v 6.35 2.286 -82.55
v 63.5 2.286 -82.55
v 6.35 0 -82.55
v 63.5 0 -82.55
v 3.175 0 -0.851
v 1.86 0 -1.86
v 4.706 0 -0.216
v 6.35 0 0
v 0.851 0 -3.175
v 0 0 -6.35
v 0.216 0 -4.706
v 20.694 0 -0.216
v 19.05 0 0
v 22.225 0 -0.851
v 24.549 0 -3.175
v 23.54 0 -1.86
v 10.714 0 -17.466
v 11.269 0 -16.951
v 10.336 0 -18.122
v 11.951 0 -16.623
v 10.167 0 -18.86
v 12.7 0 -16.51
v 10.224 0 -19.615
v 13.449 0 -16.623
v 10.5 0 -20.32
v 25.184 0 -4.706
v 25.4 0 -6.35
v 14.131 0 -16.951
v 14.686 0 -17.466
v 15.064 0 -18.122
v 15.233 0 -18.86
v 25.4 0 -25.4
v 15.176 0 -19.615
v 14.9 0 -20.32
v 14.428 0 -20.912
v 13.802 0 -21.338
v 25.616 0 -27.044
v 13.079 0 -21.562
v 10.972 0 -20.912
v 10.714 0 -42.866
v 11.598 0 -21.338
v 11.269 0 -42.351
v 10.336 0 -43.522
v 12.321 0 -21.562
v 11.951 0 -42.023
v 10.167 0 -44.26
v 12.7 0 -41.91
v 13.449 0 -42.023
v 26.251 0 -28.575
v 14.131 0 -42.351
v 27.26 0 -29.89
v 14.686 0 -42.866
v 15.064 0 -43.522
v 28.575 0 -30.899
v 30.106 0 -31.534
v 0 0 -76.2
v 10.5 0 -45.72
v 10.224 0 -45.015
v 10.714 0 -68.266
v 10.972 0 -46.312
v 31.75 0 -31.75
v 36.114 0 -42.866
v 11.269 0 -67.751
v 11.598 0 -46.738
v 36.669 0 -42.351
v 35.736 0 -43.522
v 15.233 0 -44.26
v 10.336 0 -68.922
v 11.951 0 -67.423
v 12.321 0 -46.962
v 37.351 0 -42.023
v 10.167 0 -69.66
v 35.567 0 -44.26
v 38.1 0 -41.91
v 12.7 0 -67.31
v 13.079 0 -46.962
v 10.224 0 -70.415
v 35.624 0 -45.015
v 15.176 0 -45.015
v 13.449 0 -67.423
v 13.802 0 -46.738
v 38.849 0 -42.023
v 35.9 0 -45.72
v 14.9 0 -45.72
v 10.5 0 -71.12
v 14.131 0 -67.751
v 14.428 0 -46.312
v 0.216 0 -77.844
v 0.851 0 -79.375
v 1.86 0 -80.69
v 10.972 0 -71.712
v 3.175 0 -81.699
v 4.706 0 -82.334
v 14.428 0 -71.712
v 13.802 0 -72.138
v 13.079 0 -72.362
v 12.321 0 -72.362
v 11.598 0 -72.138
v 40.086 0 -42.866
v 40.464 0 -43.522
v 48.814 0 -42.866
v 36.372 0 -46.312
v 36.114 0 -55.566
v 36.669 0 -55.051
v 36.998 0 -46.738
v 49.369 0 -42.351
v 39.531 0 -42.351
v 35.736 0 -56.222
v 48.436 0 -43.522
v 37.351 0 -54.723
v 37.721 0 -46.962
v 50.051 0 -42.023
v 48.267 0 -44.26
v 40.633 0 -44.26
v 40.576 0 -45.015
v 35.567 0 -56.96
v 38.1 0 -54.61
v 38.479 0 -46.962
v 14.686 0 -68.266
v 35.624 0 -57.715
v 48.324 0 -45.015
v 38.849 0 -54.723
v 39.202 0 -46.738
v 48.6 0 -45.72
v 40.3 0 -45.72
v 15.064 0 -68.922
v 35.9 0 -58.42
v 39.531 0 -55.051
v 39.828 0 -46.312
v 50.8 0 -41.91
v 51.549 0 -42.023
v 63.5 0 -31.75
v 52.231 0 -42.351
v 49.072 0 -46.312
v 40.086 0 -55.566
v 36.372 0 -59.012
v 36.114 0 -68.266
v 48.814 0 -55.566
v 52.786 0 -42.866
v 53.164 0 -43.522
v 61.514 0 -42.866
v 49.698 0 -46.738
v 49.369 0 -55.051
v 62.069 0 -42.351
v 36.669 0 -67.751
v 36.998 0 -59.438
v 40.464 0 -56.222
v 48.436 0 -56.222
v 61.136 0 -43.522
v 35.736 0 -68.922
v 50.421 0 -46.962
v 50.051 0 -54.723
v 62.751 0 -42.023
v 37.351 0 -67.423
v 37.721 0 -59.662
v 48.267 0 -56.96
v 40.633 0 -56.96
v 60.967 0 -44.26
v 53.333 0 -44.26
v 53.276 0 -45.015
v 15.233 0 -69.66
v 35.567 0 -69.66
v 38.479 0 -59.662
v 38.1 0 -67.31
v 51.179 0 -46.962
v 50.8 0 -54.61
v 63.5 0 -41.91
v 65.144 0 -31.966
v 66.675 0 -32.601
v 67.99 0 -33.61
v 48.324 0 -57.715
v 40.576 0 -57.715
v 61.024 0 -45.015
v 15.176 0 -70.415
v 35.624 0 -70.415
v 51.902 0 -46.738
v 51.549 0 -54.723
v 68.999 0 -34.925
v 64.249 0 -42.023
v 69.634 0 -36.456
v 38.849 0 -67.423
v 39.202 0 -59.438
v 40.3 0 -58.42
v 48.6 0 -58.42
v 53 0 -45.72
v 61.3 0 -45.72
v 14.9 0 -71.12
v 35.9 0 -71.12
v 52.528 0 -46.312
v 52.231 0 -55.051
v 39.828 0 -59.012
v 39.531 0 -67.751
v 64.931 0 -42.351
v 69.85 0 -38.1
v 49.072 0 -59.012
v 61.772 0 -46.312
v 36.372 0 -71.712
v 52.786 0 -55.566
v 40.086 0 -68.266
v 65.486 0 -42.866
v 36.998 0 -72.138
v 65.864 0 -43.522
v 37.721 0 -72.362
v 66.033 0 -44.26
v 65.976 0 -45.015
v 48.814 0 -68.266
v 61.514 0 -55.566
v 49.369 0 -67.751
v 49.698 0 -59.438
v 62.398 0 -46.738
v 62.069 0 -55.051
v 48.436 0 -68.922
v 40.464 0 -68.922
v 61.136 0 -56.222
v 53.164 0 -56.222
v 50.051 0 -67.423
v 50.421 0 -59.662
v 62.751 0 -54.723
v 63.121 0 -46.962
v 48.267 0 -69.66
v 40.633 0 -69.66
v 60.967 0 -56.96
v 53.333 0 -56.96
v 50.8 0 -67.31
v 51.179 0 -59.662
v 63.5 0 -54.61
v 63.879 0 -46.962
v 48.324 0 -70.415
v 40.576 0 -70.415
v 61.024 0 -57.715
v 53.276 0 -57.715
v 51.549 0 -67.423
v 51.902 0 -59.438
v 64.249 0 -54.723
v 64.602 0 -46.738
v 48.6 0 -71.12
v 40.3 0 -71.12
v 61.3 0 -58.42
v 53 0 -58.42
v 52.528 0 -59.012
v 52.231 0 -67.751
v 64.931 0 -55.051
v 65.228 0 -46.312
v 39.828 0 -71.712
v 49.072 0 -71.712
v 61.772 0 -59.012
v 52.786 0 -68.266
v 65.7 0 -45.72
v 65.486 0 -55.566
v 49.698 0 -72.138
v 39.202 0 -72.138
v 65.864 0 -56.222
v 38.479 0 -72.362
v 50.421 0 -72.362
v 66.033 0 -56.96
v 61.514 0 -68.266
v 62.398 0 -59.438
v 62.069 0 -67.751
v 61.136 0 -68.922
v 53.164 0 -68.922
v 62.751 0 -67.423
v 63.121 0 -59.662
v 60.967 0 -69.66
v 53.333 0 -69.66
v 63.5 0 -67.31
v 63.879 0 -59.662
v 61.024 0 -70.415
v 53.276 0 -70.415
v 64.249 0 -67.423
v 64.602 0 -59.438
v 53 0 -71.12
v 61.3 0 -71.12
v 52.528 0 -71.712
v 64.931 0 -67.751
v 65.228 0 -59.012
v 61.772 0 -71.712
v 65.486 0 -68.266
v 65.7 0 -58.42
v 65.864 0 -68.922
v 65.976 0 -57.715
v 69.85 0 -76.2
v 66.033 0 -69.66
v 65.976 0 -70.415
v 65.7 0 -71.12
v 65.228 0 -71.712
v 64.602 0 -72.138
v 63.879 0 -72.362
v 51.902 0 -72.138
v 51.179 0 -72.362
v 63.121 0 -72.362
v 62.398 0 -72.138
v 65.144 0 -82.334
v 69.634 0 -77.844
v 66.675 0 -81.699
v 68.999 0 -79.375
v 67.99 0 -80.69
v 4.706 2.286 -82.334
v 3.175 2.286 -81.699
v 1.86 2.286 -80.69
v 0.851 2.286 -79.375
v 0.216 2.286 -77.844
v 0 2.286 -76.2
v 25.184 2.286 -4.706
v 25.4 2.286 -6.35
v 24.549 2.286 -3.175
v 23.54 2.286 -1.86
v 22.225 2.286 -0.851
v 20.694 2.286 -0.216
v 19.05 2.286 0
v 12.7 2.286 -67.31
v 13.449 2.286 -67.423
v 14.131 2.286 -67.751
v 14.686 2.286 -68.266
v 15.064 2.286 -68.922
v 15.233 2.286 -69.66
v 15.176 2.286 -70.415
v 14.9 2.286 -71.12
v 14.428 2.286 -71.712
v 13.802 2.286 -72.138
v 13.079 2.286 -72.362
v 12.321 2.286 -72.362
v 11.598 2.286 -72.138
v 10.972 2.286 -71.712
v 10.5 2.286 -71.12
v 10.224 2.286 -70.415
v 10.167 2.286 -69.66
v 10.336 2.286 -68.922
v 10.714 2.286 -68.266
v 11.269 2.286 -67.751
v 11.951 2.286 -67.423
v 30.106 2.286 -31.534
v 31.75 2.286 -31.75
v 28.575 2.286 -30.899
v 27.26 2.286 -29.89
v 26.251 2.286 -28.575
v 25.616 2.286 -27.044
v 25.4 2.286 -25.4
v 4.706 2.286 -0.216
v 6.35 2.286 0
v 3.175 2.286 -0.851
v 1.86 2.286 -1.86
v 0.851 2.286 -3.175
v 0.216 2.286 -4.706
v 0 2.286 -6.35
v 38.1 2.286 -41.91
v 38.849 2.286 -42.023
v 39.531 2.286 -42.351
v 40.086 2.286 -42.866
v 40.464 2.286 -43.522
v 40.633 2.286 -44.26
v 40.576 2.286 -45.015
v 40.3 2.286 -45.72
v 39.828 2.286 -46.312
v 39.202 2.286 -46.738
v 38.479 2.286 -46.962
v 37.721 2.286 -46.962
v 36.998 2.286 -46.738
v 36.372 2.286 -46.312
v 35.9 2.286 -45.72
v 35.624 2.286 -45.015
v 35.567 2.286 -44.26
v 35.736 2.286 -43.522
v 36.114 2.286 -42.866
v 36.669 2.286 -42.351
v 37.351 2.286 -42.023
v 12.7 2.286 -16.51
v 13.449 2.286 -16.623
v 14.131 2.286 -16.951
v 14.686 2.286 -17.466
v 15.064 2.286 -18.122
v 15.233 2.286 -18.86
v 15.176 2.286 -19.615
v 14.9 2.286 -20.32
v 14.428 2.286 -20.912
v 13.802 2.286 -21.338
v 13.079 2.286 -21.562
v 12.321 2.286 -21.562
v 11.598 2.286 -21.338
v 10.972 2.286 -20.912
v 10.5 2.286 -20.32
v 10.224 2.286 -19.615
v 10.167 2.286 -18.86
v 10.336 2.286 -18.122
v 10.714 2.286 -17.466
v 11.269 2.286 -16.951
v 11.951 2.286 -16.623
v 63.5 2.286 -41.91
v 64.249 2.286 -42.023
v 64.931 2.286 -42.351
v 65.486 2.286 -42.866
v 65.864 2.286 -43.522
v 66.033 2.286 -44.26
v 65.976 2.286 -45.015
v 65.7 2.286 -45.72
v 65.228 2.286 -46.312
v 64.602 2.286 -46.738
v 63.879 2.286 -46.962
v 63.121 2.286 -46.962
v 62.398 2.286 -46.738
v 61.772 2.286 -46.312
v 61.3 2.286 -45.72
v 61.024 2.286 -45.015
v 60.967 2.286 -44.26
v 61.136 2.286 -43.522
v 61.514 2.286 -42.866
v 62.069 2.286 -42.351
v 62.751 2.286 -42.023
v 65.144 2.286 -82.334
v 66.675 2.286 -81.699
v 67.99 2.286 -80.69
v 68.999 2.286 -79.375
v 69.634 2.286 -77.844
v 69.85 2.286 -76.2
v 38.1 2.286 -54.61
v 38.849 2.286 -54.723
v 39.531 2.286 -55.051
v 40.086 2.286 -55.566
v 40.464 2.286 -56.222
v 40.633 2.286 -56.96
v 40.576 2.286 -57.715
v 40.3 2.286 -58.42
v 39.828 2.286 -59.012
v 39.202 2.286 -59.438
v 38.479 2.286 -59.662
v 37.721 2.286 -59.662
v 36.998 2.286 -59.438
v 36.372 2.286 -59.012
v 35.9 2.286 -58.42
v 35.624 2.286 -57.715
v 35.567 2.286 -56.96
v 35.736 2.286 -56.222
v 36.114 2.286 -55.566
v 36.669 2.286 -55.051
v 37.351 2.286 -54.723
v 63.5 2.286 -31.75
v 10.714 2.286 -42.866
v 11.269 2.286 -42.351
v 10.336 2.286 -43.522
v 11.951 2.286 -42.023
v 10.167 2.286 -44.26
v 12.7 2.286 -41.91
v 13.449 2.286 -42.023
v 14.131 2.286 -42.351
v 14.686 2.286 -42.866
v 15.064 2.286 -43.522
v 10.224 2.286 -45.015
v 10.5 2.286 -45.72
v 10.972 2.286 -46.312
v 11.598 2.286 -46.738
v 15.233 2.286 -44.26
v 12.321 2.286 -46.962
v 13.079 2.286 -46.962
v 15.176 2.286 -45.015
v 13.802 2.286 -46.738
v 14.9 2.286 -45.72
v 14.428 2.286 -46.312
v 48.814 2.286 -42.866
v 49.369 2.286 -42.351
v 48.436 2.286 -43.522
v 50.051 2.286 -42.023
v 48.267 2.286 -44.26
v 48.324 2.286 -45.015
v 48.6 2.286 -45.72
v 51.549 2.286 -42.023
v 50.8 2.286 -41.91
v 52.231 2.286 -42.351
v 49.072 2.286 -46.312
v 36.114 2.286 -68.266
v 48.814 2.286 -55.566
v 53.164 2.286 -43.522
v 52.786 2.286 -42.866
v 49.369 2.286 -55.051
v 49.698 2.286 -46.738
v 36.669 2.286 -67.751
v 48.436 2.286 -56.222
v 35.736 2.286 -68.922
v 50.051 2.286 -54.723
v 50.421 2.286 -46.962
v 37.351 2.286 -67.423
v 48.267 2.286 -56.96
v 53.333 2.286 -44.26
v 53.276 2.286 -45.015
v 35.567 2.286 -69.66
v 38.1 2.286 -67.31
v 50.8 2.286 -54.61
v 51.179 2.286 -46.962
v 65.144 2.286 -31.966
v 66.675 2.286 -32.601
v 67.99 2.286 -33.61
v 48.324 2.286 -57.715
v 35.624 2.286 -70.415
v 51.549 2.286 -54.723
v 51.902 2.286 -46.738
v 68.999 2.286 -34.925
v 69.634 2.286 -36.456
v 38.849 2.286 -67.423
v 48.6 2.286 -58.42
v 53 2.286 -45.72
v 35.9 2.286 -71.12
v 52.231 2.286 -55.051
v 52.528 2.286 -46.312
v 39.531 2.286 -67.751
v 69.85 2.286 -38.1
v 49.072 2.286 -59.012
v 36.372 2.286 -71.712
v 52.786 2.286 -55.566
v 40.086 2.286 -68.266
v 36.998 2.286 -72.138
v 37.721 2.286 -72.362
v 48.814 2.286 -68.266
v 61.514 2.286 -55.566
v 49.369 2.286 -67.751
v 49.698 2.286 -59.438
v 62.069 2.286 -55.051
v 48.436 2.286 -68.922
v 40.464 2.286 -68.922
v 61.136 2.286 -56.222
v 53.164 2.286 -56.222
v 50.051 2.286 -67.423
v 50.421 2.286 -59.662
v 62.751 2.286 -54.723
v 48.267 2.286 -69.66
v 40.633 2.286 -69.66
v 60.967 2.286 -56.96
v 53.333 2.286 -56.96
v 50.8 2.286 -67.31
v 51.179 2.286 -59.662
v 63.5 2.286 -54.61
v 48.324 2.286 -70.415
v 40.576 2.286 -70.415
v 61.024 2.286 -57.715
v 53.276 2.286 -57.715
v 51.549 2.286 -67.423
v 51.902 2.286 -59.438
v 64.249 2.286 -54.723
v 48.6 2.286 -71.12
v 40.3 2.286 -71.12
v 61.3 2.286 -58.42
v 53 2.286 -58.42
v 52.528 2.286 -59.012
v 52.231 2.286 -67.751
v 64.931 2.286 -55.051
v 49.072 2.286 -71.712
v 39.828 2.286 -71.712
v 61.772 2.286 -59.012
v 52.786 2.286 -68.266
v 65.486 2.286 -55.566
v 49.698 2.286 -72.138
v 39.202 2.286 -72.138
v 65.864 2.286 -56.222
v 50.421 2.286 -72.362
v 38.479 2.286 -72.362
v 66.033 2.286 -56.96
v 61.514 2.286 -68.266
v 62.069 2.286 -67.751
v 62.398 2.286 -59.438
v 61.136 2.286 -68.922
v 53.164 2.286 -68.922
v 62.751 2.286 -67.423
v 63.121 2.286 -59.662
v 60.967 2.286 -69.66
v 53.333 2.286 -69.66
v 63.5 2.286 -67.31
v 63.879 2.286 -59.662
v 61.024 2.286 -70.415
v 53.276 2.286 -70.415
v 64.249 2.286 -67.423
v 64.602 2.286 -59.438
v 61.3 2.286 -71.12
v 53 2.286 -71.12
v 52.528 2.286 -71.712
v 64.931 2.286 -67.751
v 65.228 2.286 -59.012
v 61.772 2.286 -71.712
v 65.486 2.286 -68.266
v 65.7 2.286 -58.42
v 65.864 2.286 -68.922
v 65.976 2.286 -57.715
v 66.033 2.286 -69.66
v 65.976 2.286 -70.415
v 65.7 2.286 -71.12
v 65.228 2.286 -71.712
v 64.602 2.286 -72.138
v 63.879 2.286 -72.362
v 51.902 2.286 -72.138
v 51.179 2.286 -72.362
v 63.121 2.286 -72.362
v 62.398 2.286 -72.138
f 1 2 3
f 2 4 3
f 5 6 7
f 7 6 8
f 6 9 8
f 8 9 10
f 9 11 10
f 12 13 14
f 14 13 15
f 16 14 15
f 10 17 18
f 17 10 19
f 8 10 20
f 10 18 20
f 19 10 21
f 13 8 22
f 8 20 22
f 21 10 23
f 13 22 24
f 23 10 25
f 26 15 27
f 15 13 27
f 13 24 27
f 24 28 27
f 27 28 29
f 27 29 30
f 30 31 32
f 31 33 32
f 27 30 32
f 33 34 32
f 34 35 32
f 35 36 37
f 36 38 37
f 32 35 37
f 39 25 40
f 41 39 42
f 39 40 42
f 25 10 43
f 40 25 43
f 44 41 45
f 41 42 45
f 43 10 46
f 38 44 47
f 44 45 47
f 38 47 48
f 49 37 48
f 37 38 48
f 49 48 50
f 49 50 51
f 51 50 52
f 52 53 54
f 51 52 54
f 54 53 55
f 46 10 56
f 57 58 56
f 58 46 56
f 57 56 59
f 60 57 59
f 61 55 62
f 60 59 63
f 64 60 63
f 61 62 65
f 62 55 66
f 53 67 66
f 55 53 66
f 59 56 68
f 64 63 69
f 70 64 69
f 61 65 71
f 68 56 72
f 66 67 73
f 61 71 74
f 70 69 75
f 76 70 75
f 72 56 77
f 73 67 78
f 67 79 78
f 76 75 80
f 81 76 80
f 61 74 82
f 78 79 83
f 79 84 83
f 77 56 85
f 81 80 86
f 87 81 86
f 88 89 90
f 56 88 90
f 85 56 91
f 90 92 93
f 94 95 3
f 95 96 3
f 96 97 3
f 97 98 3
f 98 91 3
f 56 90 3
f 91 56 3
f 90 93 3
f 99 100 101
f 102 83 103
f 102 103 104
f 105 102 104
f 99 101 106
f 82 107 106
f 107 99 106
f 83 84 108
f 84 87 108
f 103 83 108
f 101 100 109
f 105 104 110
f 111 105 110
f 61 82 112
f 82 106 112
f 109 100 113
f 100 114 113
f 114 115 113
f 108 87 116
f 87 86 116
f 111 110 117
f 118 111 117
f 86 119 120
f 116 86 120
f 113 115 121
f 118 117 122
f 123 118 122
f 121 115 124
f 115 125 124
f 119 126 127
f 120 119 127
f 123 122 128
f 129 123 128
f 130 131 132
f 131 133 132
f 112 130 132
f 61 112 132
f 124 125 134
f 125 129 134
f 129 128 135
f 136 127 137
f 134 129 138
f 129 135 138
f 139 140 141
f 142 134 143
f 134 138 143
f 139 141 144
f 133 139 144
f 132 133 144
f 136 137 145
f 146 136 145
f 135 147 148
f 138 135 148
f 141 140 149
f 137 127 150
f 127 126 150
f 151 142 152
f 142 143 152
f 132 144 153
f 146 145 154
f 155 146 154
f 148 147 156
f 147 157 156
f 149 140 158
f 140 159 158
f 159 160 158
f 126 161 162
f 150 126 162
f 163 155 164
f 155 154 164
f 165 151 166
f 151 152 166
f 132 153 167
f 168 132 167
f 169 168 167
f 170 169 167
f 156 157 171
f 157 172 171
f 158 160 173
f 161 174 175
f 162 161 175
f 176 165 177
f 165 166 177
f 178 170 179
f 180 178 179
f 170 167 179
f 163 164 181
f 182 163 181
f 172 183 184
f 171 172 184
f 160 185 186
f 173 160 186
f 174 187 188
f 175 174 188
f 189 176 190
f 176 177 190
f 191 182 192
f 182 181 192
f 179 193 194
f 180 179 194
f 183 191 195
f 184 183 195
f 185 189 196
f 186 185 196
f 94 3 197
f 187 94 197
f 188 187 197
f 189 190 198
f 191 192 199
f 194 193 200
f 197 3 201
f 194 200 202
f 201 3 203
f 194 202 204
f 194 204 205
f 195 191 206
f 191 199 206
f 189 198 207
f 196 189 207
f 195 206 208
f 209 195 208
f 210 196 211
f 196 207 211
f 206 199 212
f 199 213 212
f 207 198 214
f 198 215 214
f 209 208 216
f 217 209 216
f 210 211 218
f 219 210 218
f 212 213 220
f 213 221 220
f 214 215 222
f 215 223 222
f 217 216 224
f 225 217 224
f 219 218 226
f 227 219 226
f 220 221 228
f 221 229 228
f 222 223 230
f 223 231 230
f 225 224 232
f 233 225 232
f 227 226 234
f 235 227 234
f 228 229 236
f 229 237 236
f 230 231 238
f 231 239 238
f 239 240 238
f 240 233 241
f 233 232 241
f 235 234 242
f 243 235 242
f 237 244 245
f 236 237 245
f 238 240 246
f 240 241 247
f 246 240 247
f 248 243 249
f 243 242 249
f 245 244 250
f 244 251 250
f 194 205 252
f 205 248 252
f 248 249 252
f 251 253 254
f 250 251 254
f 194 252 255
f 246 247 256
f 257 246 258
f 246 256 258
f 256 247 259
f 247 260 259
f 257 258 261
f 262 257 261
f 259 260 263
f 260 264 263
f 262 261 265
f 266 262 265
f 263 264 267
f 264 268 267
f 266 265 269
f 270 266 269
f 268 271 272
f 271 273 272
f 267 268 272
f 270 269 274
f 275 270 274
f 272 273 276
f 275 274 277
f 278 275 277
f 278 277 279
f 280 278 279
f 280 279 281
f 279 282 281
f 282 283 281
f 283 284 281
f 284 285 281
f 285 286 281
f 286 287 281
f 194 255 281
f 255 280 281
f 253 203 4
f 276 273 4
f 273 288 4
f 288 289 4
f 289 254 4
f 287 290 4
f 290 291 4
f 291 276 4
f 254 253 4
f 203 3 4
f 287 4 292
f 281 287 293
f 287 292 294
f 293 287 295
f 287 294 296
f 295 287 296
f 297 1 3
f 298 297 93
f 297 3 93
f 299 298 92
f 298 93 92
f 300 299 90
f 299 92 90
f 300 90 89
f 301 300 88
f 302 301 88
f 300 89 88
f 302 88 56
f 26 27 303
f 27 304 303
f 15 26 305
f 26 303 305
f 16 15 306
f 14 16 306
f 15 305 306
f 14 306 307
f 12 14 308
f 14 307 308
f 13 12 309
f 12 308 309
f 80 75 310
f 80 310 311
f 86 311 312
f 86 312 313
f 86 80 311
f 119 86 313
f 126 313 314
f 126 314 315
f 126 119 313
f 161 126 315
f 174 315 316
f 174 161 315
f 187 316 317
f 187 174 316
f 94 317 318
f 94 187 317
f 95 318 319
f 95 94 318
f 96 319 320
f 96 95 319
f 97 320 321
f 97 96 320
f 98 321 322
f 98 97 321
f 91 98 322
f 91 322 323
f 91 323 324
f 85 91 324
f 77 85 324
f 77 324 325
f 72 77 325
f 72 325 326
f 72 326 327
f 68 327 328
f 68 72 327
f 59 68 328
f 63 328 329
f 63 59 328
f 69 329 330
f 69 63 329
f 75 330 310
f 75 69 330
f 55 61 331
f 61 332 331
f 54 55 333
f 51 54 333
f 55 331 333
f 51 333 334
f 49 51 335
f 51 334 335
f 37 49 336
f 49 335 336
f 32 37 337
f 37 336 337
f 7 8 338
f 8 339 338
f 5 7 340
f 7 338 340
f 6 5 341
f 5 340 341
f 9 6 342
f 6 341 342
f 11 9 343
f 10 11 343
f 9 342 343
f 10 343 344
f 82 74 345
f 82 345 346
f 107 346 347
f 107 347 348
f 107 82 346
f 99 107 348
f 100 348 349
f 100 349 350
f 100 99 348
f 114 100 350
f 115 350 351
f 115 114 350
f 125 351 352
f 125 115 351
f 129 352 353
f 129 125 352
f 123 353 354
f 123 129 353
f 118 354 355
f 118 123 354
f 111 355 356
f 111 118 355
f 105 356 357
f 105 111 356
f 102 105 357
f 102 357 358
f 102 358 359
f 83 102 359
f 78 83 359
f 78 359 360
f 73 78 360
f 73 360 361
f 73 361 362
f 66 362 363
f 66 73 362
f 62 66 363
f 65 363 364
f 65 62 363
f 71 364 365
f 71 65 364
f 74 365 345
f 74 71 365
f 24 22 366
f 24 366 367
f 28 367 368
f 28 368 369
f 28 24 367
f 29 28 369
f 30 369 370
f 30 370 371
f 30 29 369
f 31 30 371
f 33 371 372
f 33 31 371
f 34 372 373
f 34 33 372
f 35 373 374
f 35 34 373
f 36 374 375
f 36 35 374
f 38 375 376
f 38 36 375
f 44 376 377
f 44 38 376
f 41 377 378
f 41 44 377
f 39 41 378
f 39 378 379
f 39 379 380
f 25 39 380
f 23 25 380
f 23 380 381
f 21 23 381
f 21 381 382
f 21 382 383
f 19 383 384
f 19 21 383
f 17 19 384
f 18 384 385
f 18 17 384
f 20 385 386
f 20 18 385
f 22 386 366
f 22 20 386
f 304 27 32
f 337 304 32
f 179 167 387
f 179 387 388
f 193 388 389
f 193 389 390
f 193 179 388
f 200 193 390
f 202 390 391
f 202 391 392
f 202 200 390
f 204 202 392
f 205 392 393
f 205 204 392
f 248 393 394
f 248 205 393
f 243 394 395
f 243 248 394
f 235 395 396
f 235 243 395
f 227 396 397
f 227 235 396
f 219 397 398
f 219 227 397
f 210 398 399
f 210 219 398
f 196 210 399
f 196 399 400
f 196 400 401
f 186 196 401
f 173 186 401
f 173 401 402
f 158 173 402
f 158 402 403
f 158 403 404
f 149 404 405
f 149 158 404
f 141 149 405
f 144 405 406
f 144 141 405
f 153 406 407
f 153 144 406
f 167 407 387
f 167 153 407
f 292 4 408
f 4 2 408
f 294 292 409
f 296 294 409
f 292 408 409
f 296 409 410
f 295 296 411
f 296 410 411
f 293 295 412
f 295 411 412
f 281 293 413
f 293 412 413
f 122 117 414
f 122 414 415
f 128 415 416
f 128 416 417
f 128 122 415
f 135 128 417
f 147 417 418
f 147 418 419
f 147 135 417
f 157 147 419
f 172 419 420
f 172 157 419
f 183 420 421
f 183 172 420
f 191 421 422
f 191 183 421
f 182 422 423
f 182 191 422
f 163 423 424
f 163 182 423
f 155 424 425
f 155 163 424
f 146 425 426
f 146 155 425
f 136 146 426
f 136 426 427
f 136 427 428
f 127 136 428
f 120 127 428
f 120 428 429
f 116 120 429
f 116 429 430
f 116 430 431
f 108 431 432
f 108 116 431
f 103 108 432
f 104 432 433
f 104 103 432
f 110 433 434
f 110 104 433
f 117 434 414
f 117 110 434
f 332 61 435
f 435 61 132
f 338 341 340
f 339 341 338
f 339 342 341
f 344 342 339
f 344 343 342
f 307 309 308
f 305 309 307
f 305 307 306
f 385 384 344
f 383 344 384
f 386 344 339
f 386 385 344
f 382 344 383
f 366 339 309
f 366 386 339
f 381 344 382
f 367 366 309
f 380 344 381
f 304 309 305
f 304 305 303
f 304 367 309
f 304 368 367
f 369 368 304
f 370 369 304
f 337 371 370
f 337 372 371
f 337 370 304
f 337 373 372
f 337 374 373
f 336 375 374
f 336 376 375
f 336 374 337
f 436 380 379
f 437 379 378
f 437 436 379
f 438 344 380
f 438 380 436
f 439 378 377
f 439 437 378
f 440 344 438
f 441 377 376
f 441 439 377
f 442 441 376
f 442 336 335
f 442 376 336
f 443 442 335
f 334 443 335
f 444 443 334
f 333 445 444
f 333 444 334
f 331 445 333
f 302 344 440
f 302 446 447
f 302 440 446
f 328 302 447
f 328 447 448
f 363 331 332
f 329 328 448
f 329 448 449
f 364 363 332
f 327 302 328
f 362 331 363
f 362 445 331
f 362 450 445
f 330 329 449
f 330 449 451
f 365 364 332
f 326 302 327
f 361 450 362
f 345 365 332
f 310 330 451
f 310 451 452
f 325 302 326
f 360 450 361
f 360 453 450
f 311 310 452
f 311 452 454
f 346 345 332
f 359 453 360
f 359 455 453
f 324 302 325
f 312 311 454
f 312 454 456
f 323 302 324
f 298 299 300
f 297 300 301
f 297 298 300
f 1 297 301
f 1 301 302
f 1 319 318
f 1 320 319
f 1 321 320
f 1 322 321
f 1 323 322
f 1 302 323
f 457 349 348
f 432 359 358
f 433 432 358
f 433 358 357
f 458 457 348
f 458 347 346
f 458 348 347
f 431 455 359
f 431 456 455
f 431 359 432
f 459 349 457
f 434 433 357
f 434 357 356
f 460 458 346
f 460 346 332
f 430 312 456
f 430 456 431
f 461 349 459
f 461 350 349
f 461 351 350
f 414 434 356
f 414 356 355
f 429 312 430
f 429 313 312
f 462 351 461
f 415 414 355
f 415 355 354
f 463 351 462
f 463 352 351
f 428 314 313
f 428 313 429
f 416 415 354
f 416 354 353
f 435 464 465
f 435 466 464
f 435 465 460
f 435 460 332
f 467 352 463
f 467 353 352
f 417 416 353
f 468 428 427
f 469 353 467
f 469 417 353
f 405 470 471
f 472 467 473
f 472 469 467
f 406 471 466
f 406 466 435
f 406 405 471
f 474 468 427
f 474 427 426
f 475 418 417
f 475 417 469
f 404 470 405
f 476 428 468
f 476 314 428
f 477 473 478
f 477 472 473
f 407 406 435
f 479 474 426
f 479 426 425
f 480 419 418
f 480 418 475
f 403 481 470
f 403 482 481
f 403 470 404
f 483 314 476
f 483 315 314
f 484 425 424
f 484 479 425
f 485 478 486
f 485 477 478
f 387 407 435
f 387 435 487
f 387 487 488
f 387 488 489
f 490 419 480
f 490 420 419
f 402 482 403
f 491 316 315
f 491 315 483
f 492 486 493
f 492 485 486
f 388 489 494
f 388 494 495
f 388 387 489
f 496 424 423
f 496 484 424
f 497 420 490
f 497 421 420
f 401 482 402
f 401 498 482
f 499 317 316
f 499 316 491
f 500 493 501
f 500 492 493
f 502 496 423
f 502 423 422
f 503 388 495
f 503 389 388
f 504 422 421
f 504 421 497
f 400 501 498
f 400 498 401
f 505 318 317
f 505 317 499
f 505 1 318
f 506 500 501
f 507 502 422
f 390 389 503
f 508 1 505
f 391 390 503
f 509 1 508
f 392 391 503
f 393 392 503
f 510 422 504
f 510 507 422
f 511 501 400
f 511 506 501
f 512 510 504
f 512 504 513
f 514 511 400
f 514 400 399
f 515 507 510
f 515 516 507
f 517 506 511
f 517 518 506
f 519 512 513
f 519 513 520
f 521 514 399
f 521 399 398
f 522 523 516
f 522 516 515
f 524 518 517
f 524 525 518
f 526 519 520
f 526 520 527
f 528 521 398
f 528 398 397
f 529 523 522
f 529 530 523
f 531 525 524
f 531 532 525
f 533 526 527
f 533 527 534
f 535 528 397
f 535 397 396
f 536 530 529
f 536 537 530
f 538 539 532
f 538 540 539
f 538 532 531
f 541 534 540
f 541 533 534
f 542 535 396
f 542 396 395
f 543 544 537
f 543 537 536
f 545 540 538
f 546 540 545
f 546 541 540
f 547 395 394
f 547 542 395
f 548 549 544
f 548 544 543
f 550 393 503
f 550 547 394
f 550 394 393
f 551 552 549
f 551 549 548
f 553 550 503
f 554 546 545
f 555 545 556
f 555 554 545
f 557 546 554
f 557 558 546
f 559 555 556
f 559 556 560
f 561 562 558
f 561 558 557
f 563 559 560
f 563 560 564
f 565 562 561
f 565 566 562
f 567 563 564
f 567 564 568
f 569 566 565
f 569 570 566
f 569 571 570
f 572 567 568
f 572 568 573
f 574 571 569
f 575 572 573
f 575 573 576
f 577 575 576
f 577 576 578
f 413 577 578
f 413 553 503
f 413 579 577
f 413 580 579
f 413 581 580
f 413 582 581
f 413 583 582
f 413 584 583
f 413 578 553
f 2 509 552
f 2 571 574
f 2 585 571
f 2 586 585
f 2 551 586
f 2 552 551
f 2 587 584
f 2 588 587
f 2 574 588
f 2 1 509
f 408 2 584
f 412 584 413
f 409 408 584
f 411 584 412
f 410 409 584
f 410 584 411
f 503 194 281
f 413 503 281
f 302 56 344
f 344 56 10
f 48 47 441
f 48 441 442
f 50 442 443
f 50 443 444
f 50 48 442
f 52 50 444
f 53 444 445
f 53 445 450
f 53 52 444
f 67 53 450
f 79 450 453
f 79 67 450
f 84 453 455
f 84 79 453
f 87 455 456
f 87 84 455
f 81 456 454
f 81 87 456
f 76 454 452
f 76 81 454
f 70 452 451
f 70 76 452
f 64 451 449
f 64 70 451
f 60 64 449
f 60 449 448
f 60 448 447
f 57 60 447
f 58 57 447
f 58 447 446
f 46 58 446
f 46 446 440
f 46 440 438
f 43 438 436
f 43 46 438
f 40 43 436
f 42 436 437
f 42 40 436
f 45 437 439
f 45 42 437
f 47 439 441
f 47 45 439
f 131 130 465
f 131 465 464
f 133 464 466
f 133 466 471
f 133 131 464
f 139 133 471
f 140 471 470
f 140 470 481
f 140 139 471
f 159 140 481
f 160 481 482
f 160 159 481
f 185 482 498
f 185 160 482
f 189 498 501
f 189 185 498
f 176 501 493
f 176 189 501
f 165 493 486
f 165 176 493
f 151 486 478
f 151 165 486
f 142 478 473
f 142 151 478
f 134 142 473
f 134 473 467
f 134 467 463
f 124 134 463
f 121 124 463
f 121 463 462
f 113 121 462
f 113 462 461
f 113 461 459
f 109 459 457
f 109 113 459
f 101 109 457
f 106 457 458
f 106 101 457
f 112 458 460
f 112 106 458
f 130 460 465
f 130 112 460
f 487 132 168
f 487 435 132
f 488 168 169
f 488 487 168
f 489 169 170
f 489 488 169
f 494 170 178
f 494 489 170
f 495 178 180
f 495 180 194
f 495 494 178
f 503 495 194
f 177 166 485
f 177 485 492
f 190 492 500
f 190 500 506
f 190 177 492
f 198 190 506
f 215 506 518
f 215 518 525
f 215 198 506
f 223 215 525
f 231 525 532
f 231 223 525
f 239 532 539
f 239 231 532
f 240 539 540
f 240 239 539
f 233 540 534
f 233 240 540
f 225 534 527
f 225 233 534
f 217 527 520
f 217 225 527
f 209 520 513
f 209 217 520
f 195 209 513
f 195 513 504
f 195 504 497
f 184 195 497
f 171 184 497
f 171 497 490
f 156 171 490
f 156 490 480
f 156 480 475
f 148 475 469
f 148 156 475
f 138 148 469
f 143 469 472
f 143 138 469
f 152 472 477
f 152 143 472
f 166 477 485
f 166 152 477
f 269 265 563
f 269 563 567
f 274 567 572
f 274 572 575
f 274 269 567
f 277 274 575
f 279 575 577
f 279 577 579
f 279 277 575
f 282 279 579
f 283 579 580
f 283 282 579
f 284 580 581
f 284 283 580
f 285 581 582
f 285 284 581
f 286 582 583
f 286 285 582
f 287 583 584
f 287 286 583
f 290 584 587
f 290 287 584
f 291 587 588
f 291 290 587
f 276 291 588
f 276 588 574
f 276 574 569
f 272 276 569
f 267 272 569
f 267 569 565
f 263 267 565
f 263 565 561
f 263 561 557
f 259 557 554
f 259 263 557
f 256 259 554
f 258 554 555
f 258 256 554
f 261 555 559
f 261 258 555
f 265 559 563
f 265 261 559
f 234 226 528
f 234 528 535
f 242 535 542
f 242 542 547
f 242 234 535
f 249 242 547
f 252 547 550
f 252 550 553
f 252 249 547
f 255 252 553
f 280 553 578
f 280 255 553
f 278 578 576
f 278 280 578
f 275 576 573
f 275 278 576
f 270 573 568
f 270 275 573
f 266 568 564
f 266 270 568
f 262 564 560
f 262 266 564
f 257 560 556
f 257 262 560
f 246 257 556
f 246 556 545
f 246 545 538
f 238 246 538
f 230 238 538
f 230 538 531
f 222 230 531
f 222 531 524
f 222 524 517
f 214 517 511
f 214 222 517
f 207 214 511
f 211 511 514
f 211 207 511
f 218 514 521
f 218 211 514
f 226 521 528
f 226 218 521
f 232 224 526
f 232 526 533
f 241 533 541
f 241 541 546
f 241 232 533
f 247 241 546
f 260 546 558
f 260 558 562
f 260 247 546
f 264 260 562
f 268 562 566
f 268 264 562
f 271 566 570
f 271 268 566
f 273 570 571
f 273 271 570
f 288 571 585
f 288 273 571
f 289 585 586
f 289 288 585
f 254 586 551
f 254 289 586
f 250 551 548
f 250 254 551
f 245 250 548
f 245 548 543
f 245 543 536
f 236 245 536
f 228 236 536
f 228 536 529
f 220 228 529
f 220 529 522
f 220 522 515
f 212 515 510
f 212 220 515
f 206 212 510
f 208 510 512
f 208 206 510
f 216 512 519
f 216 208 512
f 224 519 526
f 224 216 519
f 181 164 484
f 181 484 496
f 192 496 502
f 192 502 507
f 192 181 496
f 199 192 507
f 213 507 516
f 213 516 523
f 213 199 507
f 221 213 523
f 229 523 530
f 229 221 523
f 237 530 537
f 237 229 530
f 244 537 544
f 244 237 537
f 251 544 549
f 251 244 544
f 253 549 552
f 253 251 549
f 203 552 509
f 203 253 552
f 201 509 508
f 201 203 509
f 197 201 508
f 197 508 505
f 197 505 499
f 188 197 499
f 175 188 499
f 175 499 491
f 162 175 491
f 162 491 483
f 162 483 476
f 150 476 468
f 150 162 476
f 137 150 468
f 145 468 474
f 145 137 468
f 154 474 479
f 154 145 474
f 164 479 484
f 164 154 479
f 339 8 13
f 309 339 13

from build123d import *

# Parameters (mm, degrees)
SKETCH1_R           = 2.54
BOSS_EXTRUDE1_DEPTH = 2.286
SKETCH2_W           = 25.4
SKETCH2_H           = 31.75
CUT_EXTRUDE1_DEPTH  = 2.54
FILLET1_R           = 6.35


with BuildPart() as part:
    # Sketch1 → Boss-Extrude1 (new body)
    with BuildSketch(Plane(origin=(0, 0, 0), x_dir=(1, 0, 0), z_dir=(0, 1, 0))):
        Polygon((25.4, 114.3), (0, 114.3), (0, 0), (25.4, 0), (25.4, 31.75), (69.85, 31.75), (69.85, 82.55), (25.4, 82.55), align=None)
        with Locations(Location((12.7, 95.25, 0), (0, 0, 270))):
            Circle(SKETCH1_R, mode=Mode.SUBTRACT)
        with Locations(Location((12.7, 69.85, 0), (0, 0, 270))):
            Circle(SKETCH1_R, mode=Mode.SUBTRACT)
        with Locations(Location((12.7, 44.45, 0), (0, 0, 270))):
            Circle(SKETCH1_R, mode=Mode.SUBTRACT)
        with Locations(Location((12.7, 19.05, 0), (0, 0, 270))):
            Circle(SKETCH1_R, mode=Mode.SUBTRACT)
        with Locations(Location((38.1, 69.85, 0), (0, 0, 270))):
            Circle(SKETCH1_R, mode=Mode.SUBTRACT)
        with Locations(Location((50.8, 69.85, 0), (0, 0, 270))):
            Circle(SKETCH1_R, mode=Mode.SUBTRACT)
        with Locations(Location((63.5, 69.85, 0), (0, 0, 270))):
            Circle(SKETCH1_R, mode=Mode.SUBTRACT)
        with Locations(Location((50.8, 57.15, 0), (0, 0, 270))):
            Circle(SKETCH1_R, mode=Mode.SUBTRACT)
        with Locations(Location((63.5, 57.15, 0), (0, 0, 270))):
            Circle(SKETCH1_R, mode=Mode.SUBTRACT)
        with Locations(Location((50.8, 44.45, 0), (0, 0, 270))):
            Circle(SKETCH1_R, mode=Mode.SUBTRACT)
        with Locations(Location((63.5, 44.45, 0), (0, 0, 270))):
            Circle(SKETCH1_R, mode=Mode.SUBTRACT)
        with Locations(Location((38.1, 57.15, 0), (0, 0, 270))):
            Circle(SKETCH1_R, mode=Mode.SUBTRACT)
        with Locations(Location((38.1, 44.45, 0), (0, 0, 270))):
            Circle(SKETCH1_R, mode=Mode.SUBTRACT)
    extrude(amount=BOSS_EXTRUDE1_DEPTH)

    # Sketch2 → Cut-Extrude1 (cut)
    with BuildSketch(Plane(origin=(0, 2.286, 0), x_dir=(1, 0, 0), z_dir=(0, 1, 0))):
        with Locations((12.7, 98.425)):
            Rectangle(SKETCH2_W, SKETCH2_H)
    extrude(amount=-CUT_EXTRUDE1_DEPTH, mode=Mode.SUBTRACT)

    # Fillet1
    fillet1_edges = [part.edges().sort_by_distance(p)[0] for p in [
        (69.85, 1.143, -82.55),
        (69.85, 1.143, -31.75),
        (25.4, 1.143, -31.75),
        (25.4, 1.143, 0),
        (0, 1.143, 0),
        (0, 1.143, -82.55),
    ]]
    fillet(fillet1_edges, radius=FILLET1_R)


solid = part.part
